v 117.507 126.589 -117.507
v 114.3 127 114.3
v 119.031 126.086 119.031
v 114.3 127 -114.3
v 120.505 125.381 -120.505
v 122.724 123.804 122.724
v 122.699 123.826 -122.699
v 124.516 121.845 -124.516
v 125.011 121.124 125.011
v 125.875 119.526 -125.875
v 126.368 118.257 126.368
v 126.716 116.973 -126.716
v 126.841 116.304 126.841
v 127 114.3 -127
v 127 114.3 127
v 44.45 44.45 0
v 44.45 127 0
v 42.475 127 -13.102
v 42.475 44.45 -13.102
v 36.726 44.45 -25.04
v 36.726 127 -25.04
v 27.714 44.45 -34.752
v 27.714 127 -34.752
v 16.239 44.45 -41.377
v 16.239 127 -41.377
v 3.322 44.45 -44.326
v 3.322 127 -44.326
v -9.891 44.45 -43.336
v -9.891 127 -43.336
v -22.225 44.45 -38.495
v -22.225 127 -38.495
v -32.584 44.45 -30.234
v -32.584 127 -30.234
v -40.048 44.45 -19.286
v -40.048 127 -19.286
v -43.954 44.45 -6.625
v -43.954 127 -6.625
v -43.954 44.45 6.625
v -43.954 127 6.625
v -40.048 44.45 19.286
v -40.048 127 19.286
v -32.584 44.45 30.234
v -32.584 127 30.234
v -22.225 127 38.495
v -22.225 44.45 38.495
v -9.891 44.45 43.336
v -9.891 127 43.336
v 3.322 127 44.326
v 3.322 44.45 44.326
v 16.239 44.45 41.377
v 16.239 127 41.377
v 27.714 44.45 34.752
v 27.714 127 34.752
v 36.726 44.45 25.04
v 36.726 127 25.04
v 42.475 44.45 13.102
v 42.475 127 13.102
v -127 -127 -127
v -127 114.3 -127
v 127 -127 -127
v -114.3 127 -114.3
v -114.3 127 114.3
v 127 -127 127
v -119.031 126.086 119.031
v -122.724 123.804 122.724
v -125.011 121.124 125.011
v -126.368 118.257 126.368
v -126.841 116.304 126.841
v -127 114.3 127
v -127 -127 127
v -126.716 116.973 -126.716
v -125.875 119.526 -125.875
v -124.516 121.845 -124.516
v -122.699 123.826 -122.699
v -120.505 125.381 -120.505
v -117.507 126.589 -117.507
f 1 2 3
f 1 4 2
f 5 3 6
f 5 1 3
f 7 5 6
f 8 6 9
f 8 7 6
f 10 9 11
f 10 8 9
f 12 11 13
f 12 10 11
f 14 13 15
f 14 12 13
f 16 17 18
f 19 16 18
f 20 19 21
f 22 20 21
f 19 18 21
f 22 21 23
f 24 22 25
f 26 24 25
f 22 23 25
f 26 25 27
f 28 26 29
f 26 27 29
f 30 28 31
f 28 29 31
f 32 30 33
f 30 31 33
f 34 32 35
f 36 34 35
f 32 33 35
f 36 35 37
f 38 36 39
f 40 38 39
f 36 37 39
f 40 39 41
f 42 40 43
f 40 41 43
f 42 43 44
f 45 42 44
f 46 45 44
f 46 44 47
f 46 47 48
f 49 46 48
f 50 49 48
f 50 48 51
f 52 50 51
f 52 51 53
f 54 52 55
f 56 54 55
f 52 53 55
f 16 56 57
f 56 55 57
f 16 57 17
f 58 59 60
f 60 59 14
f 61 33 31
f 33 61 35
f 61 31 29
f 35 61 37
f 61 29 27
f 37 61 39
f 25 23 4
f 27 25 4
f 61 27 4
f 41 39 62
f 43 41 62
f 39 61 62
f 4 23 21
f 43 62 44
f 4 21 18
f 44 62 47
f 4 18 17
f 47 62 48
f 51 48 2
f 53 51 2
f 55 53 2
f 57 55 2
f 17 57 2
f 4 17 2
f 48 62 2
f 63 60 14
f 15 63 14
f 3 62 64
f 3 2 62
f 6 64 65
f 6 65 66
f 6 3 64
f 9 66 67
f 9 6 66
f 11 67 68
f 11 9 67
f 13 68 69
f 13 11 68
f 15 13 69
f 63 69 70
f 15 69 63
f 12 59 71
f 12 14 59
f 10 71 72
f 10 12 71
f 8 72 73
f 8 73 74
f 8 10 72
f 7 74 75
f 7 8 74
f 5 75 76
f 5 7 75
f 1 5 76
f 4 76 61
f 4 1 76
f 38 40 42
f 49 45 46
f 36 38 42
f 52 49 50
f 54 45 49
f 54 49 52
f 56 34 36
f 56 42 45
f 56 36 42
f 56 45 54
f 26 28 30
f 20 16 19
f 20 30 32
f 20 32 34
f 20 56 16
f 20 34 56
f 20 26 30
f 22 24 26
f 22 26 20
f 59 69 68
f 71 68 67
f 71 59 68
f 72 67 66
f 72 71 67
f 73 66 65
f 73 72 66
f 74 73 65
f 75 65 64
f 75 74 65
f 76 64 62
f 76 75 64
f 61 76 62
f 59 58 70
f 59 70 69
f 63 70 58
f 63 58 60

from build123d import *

# Parameters (mm, degrees)
SKETCH2_W           = 254
SKETCH2_H           = 254
BOSS_EXTRUDE1_DEPTH = 127
SKETCH3_R           = 44.45
CUT_EXTRUDE1_DEPTH  = 82.55
FILLET1_R           = 12.7


with BuildPart() as part:
    # Sketch2 → Boss-Extrude1 (new body, symmetric)
    with BuildSketch(Plane.XY):
        Rectangle(SKETCH2_W, SKETCH2_H)
    extrude(amount=BOSS_EXTRUDE1_DEPTH, both=True)

    # Sketch3 → Cut-Extrude1 (cut)
    with BuildSketch(Plane(origin=(0, 127, 0), x_dir=(1, 0, 0), z_dir=(0, 1, 0))):
        Circle(SKETCH3_R)
    extrude(amount=-CUT_EXTRUDE1_DEPTH, mode=Mode.SUBTRACT)

    # Fillet1
    fillet1_edges = [part.edges().sort_by_distance(p)[0] for p in [
        (0, 127, 127),
        (0, 127, -127),
        (-127, 127, 0),
        (127, 127, 0),
    ]]
    fillet(fillet1_edges, radius=FILLET1_R)


solid = part.part
